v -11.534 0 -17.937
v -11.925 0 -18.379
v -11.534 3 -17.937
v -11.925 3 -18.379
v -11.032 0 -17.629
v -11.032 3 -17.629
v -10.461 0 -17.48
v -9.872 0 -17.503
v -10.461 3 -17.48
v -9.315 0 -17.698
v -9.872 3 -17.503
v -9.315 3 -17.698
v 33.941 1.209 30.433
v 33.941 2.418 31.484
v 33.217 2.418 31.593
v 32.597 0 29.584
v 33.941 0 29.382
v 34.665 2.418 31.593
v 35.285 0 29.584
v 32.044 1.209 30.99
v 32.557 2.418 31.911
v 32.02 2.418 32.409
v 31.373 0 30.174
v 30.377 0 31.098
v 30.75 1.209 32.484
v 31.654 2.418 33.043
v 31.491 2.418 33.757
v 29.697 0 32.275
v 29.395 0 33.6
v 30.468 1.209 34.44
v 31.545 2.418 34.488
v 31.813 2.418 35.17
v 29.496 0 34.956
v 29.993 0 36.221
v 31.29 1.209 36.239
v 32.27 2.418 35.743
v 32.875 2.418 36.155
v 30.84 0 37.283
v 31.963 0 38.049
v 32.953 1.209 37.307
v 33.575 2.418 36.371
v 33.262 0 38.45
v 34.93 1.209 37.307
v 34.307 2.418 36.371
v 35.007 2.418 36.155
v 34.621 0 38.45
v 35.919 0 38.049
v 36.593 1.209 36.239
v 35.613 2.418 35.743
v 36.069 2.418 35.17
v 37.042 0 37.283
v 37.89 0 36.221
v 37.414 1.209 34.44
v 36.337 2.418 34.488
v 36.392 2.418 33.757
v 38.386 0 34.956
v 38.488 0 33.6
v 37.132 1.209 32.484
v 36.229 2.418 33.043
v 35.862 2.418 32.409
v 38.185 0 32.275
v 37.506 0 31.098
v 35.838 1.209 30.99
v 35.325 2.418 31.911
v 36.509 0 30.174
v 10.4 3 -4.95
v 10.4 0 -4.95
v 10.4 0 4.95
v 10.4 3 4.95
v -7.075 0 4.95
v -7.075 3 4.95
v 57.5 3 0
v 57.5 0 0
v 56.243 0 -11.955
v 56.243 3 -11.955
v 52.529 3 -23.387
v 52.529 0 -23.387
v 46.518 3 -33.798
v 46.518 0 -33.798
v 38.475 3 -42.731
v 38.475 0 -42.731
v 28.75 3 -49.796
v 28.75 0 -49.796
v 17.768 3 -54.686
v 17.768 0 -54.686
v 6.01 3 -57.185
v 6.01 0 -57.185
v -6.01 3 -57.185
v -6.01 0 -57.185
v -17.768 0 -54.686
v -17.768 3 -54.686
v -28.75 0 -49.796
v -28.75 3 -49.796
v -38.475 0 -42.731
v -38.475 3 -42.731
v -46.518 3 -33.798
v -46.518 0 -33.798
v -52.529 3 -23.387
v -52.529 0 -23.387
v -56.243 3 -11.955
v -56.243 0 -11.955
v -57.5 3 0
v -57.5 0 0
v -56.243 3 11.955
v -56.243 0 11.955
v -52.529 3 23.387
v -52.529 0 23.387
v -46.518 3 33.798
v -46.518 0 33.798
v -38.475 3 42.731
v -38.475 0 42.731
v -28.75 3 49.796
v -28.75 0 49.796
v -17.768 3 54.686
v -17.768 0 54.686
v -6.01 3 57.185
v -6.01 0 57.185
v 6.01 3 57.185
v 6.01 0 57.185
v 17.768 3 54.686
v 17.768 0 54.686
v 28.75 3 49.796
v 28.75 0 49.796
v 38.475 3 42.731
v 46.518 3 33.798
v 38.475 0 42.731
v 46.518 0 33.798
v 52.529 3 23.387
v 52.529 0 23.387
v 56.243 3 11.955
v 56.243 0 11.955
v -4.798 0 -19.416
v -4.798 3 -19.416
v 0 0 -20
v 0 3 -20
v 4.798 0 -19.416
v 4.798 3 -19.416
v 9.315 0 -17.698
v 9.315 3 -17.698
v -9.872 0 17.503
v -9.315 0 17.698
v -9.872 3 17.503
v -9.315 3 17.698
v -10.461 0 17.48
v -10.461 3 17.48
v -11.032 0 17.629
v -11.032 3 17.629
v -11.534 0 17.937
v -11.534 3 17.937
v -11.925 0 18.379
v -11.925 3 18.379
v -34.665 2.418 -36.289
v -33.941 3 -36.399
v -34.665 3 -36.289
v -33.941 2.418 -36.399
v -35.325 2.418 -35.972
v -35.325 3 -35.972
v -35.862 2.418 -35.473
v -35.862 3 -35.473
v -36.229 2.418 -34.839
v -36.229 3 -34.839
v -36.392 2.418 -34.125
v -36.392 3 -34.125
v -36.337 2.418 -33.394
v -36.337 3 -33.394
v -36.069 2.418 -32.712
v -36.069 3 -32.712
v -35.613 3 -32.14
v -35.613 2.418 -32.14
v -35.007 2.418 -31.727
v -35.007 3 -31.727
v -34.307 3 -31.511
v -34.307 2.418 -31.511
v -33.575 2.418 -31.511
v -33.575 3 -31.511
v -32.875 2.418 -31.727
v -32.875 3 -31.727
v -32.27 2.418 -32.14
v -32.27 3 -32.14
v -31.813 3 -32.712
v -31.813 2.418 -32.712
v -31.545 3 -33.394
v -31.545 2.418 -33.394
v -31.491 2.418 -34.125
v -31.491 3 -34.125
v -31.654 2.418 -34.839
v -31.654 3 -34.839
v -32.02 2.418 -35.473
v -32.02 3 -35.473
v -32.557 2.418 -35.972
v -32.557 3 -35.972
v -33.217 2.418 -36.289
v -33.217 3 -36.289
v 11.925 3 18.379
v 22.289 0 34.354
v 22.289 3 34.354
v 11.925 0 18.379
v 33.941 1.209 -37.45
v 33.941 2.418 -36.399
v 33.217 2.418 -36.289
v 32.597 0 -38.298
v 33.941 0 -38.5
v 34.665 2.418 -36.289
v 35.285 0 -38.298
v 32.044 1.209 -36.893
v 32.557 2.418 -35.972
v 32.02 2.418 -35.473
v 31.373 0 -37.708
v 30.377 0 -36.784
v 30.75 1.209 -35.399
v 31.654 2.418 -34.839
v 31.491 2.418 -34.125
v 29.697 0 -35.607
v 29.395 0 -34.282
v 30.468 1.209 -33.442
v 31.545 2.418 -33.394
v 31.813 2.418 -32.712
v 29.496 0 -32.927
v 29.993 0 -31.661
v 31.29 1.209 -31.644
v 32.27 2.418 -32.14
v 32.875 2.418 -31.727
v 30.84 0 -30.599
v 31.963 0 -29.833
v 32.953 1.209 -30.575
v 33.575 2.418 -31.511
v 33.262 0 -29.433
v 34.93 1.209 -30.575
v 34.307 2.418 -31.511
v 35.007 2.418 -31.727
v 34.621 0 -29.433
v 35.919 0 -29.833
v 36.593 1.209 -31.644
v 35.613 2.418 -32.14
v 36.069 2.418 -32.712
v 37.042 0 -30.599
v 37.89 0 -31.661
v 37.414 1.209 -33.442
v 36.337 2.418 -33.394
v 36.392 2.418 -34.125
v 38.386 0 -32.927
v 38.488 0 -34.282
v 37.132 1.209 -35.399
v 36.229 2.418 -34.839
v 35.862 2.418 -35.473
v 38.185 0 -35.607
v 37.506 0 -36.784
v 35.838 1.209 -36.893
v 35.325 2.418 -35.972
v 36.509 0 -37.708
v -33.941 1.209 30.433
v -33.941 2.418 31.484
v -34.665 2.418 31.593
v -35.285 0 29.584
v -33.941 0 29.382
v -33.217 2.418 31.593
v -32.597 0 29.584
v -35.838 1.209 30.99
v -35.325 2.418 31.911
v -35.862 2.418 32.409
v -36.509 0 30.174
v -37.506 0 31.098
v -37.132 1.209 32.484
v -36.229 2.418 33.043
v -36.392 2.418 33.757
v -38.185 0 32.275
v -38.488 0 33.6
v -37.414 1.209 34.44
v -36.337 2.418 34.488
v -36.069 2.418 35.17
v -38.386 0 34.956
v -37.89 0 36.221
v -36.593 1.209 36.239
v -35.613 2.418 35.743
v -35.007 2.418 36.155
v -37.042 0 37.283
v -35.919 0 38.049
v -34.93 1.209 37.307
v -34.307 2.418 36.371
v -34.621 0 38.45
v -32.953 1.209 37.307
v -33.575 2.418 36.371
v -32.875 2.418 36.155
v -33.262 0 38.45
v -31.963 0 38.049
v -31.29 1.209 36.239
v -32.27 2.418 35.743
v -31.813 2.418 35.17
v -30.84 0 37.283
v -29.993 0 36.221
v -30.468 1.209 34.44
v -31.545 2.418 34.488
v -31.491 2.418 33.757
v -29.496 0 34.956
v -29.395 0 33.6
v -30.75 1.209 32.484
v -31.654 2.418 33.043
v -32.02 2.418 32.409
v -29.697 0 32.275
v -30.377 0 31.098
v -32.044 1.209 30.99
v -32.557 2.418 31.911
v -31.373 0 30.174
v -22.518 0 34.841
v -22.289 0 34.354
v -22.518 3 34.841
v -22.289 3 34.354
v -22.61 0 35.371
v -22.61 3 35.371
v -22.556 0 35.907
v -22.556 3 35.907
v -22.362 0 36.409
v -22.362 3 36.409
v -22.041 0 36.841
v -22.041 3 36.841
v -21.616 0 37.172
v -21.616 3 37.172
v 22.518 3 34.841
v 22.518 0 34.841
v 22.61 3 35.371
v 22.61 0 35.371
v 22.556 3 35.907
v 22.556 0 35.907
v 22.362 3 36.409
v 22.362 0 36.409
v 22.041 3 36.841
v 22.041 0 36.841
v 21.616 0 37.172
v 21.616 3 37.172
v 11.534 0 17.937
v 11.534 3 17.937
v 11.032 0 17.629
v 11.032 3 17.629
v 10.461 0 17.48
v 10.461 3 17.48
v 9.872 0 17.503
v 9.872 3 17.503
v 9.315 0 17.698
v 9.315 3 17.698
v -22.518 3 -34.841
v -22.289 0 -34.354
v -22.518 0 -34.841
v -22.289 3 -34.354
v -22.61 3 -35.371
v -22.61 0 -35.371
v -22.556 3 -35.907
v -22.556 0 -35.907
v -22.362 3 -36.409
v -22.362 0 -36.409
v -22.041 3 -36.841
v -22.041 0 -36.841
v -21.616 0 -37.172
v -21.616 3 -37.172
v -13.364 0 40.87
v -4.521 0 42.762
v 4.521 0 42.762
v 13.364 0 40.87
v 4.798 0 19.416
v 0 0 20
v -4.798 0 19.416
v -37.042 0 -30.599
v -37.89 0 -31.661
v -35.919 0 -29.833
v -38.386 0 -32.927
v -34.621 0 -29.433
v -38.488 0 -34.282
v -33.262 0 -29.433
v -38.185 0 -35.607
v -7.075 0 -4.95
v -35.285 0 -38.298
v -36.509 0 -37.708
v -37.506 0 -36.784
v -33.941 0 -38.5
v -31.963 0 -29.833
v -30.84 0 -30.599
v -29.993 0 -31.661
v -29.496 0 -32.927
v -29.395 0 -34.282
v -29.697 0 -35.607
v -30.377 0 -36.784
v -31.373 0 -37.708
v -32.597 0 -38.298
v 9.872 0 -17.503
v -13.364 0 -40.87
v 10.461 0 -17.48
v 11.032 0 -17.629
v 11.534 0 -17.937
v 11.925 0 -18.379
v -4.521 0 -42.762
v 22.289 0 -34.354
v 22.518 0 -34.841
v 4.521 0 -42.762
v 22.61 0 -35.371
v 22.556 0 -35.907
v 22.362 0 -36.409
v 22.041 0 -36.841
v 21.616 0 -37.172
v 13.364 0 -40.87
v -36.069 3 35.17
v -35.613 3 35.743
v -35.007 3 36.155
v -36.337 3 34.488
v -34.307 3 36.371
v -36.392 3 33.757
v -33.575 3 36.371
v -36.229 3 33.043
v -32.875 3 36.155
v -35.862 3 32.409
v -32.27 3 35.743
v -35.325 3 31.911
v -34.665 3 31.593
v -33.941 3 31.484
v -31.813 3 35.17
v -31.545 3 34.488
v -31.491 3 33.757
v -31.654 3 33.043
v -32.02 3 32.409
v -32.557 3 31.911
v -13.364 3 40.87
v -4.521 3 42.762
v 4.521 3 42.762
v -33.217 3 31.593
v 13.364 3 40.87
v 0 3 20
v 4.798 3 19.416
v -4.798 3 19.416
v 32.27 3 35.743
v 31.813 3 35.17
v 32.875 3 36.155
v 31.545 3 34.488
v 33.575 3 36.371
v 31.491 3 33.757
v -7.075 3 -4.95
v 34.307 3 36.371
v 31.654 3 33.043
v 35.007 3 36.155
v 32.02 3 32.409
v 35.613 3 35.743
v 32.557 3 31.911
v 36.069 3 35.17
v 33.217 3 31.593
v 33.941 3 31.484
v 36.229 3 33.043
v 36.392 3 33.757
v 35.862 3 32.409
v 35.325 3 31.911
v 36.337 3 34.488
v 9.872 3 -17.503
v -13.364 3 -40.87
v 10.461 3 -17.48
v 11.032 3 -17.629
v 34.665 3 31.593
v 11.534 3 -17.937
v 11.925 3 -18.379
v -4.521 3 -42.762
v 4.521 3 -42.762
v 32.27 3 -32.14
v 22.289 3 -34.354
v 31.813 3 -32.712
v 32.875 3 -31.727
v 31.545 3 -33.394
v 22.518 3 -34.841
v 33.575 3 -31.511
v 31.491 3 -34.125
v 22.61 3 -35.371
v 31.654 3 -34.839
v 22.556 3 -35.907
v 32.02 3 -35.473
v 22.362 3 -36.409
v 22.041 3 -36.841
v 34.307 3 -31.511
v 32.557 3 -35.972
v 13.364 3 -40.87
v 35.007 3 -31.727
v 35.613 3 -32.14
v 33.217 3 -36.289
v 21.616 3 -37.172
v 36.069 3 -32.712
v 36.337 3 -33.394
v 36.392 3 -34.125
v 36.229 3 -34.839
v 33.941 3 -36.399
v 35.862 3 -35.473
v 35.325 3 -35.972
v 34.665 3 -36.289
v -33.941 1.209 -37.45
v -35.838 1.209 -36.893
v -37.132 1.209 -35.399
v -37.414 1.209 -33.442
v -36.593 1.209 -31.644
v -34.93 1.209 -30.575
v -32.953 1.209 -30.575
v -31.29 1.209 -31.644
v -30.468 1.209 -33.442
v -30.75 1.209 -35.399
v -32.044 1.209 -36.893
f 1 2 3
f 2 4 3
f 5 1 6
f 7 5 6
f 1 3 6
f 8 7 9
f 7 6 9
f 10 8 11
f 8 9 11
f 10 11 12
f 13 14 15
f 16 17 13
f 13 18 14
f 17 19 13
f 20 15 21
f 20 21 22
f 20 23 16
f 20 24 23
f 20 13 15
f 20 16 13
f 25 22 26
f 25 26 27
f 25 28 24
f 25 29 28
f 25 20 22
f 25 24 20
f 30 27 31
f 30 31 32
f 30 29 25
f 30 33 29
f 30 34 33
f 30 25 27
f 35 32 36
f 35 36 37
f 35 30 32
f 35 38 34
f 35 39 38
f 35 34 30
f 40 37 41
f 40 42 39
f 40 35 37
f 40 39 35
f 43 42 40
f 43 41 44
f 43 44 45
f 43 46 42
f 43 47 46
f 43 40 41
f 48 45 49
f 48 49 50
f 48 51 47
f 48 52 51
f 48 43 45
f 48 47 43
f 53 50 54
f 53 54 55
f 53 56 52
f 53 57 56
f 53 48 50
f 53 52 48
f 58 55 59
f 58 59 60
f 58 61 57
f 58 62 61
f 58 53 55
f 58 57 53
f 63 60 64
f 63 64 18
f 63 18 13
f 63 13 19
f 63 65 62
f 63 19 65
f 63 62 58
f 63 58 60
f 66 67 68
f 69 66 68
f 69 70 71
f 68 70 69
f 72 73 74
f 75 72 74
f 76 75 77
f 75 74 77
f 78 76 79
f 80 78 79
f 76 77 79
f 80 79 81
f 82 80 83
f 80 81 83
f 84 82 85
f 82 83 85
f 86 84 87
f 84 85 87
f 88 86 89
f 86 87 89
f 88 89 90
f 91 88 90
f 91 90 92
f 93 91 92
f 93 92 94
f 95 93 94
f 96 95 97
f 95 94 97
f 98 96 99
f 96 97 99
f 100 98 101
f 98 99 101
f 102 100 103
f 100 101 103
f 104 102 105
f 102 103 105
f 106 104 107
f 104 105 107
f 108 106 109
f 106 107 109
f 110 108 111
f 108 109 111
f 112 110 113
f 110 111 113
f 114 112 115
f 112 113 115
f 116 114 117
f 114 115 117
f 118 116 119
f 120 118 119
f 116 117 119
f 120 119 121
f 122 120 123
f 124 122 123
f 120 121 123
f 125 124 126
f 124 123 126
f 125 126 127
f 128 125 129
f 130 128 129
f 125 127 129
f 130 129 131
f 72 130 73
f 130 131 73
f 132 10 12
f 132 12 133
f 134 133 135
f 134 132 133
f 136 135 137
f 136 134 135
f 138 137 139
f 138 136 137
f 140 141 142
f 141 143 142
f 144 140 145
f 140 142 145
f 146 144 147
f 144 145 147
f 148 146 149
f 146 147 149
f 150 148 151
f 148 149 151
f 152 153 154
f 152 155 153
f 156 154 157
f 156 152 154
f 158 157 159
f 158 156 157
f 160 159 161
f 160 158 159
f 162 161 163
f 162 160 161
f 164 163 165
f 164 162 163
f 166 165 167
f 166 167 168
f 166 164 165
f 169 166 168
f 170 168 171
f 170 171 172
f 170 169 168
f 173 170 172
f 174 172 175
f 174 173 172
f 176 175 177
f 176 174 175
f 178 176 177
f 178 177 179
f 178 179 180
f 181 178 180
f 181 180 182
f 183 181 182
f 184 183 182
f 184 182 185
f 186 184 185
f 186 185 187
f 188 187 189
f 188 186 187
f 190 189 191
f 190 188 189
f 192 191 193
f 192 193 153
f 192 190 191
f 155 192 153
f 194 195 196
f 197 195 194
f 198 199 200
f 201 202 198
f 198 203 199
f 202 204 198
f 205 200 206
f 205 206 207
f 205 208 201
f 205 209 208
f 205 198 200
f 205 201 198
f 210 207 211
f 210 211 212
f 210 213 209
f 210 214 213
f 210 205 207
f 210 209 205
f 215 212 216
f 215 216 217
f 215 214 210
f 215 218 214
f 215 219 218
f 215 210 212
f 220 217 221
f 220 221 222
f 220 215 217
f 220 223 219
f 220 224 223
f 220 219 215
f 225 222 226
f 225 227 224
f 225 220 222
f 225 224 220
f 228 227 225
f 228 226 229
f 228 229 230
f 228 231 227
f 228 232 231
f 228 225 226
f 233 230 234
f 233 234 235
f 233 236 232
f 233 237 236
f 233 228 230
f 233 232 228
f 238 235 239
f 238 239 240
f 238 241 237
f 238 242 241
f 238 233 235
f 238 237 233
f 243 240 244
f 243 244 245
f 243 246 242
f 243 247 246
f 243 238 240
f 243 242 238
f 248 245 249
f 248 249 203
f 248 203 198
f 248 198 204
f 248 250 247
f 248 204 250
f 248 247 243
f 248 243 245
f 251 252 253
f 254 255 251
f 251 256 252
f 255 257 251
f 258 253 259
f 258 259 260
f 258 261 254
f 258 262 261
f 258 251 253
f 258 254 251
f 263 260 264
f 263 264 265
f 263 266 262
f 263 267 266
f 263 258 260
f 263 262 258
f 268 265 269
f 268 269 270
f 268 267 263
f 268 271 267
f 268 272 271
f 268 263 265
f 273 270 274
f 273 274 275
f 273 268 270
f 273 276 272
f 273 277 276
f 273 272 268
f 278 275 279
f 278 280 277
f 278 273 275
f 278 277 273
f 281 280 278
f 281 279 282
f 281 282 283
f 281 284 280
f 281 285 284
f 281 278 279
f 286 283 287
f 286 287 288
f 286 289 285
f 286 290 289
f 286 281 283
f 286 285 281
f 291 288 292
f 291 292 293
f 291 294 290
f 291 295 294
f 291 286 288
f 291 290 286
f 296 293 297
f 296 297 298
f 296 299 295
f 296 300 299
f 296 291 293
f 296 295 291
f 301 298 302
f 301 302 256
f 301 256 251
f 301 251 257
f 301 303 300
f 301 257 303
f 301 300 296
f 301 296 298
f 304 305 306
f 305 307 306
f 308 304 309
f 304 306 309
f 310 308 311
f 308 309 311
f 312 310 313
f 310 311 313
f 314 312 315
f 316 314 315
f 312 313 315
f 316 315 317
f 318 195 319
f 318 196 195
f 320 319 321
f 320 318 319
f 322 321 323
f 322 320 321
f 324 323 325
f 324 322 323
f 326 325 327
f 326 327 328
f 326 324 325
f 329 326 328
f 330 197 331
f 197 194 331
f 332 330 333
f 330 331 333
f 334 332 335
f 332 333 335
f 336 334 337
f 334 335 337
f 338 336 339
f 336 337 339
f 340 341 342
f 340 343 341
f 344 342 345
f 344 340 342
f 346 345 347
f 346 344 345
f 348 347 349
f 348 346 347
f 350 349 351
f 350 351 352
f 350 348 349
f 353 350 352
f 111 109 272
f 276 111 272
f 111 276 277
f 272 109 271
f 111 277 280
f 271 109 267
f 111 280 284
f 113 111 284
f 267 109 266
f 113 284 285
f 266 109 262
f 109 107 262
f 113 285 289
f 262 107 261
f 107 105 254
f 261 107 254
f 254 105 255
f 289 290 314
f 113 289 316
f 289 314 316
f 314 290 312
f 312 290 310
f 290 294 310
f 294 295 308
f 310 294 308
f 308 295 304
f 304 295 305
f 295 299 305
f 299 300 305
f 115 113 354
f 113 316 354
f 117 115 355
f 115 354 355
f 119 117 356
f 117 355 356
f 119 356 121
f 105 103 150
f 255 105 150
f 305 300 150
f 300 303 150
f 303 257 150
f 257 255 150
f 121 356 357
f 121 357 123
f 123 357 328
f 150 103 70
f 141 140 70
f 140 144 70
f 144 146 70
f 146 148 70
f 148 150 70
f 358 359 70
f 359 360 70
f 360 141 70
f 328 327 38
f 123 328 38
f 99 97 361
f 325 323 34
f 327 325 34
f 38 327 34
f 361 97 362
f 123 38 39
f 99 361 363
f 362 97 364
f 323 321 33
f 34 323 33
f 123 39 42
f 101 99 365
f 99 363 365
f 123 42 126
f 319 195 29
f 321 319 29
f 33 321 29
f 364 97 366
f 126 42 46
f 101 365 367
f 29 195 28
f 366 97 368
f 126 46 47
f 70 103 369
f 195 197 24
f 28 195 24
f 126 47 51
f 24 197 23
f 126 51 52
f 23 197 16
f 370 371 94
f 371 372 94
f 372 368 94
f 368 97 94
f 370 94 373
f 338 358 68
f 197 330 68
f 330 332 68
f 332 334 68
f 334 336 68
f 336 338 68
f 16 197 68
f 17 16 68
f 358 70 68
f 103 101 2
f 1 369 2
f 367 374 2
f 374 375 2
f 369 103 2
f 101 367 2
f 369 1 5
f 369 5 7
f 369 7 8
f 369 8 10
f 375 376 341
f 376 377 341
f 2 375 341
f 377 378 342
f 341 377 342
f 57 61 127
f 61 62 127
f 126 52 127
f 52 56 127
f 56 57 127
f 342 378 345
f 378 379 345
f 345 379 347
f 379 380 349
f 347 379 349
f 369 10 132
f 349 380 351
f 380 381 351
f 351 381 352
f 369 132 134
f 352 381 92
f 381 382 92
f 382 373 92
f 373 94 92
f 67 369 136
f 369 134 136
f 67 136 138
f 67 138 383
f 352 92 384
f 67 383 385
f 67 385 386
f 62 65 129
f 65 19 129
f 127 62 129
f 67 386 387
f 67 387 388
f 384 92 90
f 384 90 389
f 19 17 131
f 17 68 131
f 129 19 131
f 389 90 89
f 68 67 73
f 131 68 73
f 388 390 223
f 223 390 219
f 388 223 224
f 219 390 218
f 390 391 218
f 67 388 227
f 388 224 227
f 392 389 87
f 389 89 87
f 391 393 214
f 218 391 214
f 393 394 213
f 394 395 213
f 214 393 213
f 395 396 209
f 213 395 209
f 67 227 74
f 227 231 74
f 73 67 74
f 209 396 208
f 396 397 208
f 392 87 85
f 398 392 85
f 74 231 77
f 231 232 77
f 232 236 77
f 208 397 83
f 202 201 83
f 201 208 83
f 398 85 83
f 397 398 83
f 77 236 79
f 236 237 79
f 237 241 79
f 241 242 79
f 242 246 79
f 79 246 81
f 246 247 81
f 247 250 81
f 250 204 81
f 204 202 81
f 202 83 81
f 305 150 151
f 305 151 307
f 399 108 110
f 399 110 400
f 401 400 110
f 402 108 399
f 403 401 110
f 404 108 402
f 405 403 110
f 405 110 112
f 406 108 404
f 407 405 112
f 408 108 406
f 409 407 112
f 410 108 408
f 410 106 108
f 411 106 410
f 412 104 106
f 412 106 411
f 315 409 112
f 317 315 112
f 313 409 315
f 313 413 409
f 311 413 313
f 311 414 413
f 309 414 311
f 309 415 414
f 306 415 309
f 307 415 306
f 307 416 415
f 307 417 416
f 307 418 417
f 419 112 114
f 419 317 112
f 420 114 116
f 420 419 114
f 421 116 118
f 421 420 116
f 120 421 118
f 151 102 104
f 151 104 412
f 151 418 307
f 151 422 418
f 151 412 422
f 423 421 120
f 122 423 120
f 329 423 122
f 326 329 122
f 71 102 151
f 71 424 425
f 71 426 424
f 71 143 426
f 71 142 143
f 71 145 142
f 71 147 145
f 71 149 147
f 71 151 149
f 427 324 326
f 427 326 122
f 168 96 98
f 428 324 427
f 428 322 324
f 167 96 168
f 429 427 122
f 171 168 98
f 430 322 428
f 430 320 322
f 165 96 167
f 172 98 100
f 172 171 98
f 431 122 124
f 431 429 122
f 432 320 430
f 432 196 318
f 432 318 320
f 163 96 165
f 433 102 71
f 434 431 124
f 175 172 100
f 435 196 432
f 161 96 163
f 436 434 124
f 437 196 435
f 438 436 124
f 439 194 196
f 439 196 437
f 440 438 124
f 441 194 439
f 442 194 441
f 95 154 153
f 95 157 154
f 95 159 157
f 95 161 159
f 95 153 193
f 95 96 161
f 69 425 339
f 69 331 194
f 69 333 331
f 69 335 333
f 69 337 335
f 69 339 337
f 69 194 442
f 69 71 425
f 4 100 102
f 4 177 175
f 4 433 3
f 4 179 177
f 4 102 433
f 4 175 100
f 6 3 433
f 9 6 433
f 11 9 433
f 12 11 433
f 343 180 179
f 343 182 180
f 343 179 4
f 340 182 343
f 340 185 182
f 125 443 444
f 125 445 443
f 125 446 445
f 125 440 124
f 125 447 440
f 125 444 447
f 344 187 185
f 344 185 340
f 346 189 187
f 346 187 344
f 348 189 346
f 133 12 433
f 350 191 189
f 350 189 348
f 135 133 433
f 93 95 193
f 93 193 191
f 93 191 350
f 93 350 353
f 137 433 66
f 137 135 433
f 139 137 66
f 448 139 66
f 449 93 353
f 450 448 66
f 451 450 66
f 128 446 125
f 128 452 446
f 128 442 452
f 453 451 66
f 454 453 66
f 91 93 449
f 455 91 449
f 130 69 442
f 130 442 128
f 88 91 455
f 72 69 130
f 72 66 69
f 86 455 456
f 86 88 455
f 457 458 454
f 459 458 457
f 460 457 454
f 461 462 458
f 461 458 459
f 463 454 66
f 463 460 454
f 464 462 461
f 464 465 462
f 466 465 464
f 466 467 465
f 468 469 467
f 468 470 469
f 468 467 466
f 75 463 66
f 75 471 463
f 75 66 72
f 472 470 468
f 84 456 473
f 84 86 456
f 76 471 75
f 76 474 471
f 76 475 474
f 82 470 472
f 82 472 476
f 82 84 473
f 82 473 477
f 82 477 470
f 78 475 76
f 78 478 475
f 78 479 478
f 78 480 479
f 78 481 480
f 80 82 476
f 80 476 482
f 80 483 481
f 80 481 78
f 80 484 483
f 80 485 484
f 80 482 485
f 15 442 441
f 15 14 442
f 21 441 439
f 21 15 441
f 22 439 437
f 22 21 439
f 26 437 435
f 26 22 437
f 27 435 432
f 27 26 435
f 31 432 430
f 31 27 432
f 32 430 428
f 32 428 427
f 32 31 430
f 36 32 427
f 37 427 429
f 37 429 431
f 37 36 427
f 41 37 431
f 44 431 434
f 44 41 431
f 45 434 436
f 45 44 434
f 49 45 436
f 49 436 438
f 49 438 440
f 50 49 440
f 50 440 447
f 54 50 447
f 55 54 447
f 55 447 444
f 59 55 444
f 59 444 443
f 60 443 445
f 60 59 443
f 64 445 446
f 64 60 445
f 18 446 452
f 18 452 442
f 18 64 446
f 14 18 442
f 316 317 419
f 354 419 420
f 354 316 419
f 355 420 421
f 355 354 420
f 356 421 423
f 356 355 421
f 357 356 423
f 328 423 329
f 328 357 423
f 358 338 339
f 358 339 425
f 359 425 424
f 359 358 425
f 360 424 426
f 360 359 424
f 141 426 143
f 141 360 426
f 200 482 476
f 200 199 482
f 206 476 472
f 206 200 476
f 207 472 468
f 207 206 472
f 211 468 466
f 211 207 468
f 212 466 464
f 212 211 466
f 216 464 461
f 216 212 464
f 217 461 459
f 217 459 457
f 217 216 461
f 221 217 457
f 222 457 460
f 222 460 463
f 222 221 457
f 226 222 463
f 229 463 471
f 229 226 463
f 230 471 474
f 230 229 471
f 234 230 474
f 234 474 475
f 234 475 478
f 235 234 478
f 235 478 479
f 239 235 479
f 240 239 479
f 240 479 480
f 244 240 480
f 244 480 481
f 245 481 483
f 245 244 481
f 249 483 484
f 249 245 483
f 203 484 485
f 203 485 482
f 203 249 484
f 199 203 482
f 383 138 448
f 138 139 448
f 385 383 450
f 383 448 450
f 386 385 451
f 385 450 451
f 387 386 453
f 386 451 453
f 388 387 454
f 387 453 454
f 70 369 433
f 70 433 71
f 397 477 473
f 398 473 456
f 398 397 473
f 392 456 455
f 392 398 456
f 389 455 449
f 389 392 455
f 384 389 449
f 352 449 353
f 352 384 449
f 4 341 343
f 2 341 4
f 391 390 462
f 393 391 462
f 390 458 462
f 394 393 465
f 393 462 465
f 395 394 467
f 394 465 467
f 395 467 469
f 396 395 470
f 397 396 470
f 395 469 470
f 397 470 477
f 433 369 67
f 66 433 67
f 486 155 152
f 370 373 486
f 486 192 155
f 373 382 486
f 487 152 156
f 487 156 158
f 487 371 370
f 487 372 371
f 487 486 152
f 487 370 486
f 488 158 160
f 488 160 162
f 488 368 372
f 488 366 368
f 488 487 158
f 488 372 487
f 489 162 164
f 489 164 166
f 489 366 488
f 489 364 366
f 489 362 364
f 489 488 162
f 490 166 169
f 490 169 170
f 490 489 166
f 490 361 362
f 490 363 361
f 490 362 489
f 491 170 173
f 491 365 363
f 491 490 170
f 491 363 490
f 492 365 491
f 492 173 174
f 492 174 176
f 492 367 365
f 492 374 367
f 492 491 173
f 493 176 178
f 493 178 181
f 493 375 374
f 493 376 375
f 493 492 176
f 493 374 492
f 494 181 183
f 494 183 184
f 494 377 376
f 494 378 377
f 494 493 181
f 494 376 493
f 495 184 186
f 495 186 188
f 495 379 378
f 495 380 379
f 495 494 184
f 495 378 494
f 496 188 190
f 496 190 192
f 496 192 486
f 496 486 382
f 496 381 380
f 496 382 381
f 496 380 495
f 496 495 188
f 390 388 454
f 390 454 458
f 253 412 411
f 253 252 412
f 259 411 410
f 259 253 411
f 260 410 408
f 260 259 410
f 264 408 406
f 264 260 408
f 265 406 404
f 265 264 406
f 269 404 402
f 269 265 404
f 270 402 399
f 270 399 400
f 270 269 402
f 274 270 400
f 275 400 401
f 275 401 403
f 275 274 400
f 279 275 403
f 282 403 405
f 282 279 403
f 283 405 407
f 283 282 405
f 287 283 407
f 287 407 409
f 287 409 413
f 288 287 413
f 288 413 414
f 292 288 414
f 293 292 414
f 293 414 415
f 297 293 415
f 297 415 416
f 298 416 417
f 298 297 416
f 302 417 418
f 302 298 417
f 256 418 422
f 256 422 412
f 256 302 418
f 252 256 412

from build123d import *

# Parameters (mm, degrees)
SKETCH1_R                                     = 57.5
SKETCH1_R_2                                   = 0.5
SKETCH1_W                                     = 9.325
SKETCH1_H                                     = 9.9
BOSS_EXTRUDE1_DEPTH                           = 3
CSK_FOR_8_FLAT_HEAD_SOCKET_CAP_SCREW1_A_COUNT = 2
CSK_FOR_8_FLAT_HEAD_SOCKET_CAP_SCREW1_A_PITCH = 67.882250994
CSK_FOR_8_FLAT_HEAD_SOCKET_CAP_SCRE_2_COUNT   = 2
CSK_FOR_8_FLAT_HEAD_SOCKET_CAP_SCRE_2_PITCH   = 96
CSK_FOR_8_FLAT_HEAD_SOCKET_CAP_SCRE_3_COUNT   = 2
CSK_FOR_8_FLAT_HEAD_SOCKET_CAP_SCRE_3_PITCH   = 67.882250994
SKETCH5_W                                     = 4.075
SKETCH5_H                                     = 9.9
CUT_EXTRUDE2_DEPTH                            = 4
CUT_EXTRUDE4_DEPTH                            = 4
FILLET3_R                                     = 2


with BuildPart() as part:
    # Sketch1 → Boss-Extrude1 (new body)
    with BuildSketch(Plane(origin=(0, 0, 0), x_dir=(1, 0, 0), z_dir=(0, 1, 0))):
        Circle(SKETCH1_R)
        with Locations((-33.941125497, 33.941125497)):
            Circle(SKETCH1_R_2, mode=Mode.SUBTRACT)
        with Locations((33.941125497, 33.941125497)):
            Circle(SKETCH1_R_2, mode=Mode.SUBTRACT)
        with Locations((33.941125497, -33.941125497)):
            Circle(SKETCH1_R_2, mode=Mode.SUBTRACT)
        with Locations((-33.941125497, -33.941125497)):
            Circle(SKETCH1_R_2, mode=Mode.SUBTRACT)
        with Locations((1.6625, 0)):
            Rectangle(SKETCH1_W, SKETCH1_H, mode=Mode.SUBTRACT)
    extrude(amount=BOSS_EXTRUDE1_DEPTH)

    # Sketch2 → CSK for #8 Flat Head Socket Cap Screw1 (revolve, cut)
    with BuildSketch(Plane(origin=(-33.941125497, 0, 33.941125497), x_dir=(0, 0, -1), z_dir=(1, 0, 0))):
        Polygon((0, 0), (0, 3), (2.45745, 3), (2.45745, 2.417901837), (4.5593, 0), align=None)
    csk_for_8_flat_head_socket_cap_screw1 = revolve(axis=Axis((-33.941125497, -6.35, 33.941125497), (0, 1, 0)), mode=Mode.SUBTRACT)

    # CSK for #8 Flat Head Socket Cap Screw1 a: CSK for #8 Flat Head Socket Cap Screw1 ×2
    with Locations(*[(i * CSK_FOR_8_FLAT_HEAD_SOCKET_CAP_SCREW1_A_PITCH, 0, 0) for i in range(1, CSK_FOR_8_FLAT_HEAD_SOCKET_CAP_SCREW1_A_COUNT)]):
        add(csk_for_8_flat_head_socket_cap_screw1, mode=Mode.SUBTRACT)

    # CSK for _8 Flat Head Socket Cap Scre 2: CSK for #8 Flat Head Socket Cap Screw1 ×2
    with Locations(*[Vector(0.707106781, 0, -0.707106781) * (i * CSK_FOR_8_FLAT_HEAD_SOCKET_CAP_SCRE_2_PITCH) for i in range(1, CSK_FOR_8_FLAT_HEAD_SOCKET_CAP_SCRE_2_COUNT)]):
        add(csk_for_8_flat_head_socket_cap_screw1, mode=Mode.SUBTRACT)

    # CSK for _8 Flat Head Socket Cap Scre 3: CSK for #8 Flat Head Socket Cap Screw1 ×2
    with Locations(*[(0, 0, -i * CSK_FOR_8_FLAT_HEAD_SOCKET_CAP_SCRE_3_PITCH) for i in range(1, CSK_FOR_8_FLAT_HEAD_SOCKET_CAP_SCRE_3_COUNT)]):
        add(csk_for_8_flat_head_socket_cap_screw1, mode=Mode.SUBTRACT)

    # Sketch5 → Cut-Extrude2 (cut, through all)
    with BuildSketch(Plane.XZ):
        with Locations((8.3625, 0)):
            Rectangle(SKETCH5_W, SKETCH5_H)
        with Locations((-5.0375, 0)):
            Rectangle(SKETCH5_W, SKETCH5_H)
    extrude(amount=-CUT_EXTRUDE2_DEPTH, mode=Mode.SUBTRACT)

    # Sketch10 → Cut-Extrude4 (cut, through all)
    with BuildSketch(Plane.XZ):
        with BuildLine():
            Line((23.40393029, 36.072926787), (10.885548972, 16.778105482))
            ThreePointArc((10.885548972, 16.778105482), (0, 20), (-10.885548972, 16.778105482))
            Line((-10.885548972, 16.778105482), (-23.40393029, 36.072926787))
            ThreePointArc((-23.40393029, 36.072926787), (0, 43), (23.40393029, 36.072926787))
        make_face()
        with BuildLine():
            Line((-23.40393029, -36.072926787), (-10.885548972, -16.778105482))
            ThreePointArc((-10.885548972, -16.778105482), (0, -20), (10.885548972, -16.778105482))
            Line((10.885548972, -16.778105482), (23.40393029, -36.072926787))
            ThreePointArc((23.40393029, -36.072926787), (0, -43), (-23.40393029, -36.072926787))
        make_face()
    extrude(amount=-CUT_EXTRUDE4_DEPTH, mode=Mode.SUBTRACT)

    # Fillet3
    fillet3_edges = [part.edges().sort_by_distance(p)[0] for p in [
        (10.885548972, 1.5, 16.778105482),
        (-10.885548972, 1.5, 16.778105482),
        (-10.885548972, 1.5, -16.778105482),
        (10.885548972, 1.5, -16.778105482),
        (23.40393029, 1.5, -36.072926787),
        (-23.40393029, 1.5, -36.072926787),
        (-23.40393029, 1.5, 36.072926787),
        (23.40393029, 1.5, 36.072926787),
    ]]
    fillet(fillet3_edges, radius=FILLET3_R)


solid = part.part
